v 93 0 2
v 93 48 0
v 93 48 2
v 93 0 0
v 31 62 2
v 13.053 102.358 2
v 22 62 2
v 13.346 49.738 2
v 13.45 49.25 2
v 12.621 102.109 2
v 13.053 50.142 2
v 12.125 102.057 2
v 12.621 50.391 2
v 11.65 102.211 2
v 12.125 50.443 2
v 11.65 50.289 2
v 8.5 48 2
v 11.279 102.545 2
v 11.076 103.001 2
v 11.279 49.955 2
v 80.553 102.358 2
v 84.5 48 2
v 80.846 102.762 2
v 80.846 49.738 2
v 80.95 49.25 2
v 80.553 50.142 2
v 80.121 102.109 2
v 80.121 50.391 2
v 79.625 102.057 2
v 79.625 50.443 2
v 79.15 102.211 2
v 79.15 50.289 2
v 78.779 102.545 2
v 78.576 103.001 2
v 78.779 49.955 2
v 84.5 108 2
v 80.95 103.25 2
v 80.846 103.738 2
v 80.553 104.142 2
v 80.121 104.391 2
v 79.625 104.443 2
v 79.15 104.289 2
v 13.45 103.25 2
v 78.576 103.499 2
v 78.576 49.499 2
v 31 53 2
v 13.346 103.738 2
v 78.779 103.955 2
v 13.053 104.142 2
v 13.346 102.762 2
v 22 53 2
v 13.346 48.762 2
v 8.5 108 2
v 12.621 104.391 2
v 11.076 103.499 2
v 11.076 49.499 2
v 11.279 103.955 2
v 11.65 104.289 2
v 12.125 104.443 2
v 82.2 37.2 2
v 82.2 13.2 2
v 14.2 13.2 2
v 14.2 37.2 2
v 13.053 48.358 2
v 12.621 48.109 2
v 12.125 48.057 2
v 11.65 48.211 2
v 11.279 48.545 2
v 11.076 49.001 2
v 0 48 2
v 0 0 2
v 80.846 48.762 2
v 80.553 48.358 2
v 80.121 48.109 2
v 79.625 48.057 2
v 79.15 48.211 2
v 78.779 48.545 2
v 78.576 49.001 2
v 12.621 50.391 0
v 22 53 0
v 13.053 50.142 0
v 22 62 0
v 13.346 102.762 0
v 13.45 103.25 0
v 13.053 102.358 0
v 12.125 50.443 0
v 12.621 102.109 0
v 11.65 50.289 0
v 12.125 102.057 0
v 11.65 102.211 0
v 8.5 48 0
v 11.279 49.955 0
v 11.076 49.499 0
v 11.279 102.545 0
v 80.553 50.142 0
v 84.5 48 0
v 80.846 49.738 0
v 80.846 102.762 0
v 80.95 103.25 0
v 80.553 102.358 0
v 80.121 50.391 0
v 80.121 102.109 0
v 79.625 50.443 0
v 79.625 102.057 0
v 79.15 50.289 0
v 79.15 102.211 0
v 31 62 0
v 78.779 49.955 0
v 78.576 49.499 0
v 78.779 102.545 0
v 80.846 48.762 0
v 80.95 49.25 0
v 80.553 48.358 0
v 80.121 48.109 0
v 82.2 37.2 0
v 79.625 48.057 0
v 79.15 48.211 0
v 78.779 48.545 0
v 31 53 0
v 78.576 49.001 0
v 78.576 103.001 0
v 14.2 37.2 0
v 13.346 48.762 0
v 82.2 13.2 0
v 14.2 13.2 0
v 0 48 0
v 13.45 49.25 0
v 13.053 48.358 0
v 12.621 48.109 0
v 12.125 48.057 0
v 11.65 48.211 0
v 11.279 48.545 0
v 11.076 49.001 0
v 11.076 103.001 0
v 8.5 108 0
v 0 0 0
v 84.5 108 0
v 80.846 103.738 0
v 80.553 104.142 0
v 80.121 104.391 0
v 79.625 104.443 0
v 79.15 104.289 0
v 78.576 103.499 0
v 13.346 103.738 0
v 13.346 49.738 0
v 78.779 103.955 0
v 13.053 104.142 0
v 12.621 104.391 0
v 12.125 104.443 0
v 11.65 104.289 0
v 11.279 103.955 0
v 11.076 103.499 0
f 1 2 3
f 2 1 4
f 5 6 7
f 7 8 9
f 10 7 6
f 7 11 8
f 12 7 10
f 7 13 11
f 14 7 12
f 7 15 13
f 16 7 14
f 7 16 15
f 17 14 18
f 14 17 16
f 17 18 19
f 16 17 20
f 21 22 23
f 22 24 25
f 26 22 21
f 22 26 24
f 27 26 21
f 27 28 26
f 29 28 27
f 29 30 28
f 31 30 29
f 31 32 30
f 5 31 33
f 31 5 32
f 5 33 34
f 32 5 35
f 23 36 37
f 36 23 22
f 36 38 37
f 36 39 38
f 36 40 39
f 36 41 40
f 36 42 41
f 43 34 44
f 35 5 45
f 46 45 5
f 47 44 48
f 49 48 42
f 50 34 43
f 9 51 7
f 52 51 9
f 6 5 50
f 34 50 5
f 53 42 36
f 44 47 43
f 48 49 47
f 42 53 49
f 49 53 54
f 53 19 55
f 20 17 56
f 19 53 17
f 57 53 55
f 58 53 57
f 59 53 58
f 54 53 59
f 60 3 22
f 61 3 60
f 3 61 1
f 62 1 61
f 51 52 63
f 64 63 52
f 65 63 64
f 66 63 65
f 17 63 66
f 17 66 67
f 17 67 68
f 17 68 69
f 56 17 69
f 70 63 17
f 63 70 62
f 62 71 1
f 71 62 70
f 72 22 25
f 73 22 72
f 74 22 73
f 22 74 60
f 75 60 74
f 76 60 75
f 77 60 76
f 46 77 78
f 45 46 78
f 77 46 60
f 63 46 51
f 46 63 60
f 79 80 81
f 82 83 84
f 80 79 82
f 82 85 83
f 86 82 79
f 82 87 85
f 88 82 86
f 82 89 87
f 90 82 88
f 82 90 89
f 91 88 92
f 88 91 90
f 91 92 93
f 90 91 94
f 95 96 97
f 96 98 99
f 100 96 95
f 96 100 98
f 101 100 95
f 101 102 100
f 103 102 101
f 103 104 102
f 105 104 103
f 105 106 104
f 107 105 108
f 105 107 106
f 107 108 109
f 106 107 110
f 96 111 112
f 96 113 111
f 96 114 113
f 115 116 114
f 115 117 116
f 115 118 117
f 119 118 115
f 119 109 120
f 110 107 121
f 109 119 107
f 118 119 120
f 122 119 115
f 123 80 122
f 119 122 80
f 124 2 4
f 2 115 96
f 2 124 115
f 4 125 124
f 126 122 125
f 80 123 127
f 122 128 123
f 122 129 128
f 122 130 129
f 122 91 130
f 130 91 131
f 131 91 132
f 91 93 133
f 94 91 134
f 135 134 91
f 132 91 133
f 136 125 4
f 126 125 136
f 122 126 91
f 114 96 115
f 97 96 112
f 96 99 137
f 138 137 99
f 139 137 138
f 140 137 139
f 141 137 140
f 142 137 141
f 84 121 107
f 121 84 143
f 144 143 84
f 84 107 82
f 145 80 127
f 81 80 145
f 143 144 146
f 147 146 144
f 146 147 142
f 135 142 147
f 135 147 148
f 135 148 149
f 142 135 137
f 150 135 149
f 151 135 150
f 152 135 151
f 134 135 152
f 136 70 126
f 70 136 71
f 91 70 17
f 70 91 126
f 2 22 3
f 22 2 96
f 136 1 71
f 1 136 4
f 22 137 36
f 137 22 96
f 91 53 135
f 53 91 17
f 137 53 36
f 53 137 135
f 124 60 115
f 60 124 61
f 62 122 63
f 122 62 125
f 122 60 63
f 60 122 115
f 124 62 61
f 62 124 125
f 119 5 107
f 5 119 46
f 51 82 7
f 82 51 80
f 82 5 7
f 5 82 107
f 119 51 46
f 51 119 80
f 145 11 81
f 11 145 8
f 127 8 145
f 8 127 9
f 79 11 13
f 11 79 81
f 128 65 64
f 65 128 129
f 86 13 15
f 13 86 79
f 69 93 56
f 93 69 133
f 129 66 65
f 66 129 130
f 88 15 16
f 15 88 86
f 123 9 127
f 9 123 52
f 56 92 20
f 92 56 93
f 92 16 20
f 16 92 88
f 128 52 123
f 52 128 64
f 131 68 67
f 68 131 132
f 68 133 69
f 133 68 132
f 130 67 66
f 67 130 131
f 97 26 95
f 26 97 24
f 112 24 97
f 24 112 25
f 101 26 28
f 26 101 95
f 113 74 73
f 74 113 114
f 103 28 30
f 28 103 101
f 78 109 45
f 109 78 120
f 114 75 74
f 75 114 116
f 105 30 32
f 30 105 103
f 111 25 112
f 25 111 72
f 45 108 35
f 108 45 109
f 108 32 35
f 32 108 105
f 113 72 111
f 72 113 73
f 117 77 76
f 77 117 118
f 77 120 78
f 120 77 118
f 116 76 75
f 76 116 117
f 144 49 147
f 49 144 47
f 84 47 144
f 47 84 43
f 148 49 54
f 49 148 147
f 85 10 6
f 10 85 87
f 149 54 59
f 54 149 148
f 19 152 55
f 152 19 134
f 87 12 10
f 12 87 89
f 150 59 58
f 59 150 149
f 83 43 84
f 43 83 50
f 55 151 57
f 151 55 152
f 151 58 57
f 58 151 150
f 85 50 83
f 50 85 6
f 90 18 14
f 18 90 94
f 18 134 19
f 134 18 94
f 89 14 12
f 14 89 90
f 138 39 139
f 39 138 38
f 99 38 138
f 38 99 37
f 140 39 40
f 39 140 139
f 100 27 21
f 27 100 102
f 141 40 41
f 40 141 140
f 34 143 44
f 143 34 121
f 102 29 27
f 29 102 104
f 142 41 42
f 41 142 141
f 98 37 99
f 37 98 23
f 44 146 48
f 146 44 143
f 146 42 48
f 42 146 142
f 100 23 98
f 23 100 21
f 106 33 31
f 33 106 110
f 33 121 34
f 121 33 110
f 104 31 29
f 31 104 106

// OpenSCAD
module heat_set_insert_hole(translate_pos = [0,0,0], insert_xy_dim = [6.5,6.5], insert_height = 37, hole_r=1.2, hole_h=7.5, cylinder_fn = 15){
    insert_width = insert_xy_dim[0];
    insert_depth = insert_xy_dim[1];
    insert_height = insert_height;
    
    translate(translate_pos){
        translate([insert_width/2,insert_depth/2,0]){
            cylinder(hole_h+1,hole_r,hole_r, $fn=cylinder_fn);
        }
    }
}

z_size = 0;
thickness = 2;
chassis_lcd_dim = [93,48,z_size+thickness];
chassis_perfboard_dim = [76,90,z_size+thickness];
chassis_lcd_opening = [68,24,999];

difference(){
    union(){
    cube(chassis_lcd_dim);
    translate([15-6.5,18,0]){
    cube(chassis_perfboard_dim);
        }
    }
    //lcd opening
    translate([14.2,13.2,-55]){
    cube(chassis_lcd_opening);
    }

    //button opening
    translate([22.0,53,-55]){
    cube([9,9,100]);
    }
heat_set_insert_hole([9,46,-1]);
heat_set_insert_hole([9+76-6.5-2,46,-1]);

heat_set_insert_hole([9,100,-1]);
heat_set_insert_hole([9+76-6.5-2,100,-1]);

}
